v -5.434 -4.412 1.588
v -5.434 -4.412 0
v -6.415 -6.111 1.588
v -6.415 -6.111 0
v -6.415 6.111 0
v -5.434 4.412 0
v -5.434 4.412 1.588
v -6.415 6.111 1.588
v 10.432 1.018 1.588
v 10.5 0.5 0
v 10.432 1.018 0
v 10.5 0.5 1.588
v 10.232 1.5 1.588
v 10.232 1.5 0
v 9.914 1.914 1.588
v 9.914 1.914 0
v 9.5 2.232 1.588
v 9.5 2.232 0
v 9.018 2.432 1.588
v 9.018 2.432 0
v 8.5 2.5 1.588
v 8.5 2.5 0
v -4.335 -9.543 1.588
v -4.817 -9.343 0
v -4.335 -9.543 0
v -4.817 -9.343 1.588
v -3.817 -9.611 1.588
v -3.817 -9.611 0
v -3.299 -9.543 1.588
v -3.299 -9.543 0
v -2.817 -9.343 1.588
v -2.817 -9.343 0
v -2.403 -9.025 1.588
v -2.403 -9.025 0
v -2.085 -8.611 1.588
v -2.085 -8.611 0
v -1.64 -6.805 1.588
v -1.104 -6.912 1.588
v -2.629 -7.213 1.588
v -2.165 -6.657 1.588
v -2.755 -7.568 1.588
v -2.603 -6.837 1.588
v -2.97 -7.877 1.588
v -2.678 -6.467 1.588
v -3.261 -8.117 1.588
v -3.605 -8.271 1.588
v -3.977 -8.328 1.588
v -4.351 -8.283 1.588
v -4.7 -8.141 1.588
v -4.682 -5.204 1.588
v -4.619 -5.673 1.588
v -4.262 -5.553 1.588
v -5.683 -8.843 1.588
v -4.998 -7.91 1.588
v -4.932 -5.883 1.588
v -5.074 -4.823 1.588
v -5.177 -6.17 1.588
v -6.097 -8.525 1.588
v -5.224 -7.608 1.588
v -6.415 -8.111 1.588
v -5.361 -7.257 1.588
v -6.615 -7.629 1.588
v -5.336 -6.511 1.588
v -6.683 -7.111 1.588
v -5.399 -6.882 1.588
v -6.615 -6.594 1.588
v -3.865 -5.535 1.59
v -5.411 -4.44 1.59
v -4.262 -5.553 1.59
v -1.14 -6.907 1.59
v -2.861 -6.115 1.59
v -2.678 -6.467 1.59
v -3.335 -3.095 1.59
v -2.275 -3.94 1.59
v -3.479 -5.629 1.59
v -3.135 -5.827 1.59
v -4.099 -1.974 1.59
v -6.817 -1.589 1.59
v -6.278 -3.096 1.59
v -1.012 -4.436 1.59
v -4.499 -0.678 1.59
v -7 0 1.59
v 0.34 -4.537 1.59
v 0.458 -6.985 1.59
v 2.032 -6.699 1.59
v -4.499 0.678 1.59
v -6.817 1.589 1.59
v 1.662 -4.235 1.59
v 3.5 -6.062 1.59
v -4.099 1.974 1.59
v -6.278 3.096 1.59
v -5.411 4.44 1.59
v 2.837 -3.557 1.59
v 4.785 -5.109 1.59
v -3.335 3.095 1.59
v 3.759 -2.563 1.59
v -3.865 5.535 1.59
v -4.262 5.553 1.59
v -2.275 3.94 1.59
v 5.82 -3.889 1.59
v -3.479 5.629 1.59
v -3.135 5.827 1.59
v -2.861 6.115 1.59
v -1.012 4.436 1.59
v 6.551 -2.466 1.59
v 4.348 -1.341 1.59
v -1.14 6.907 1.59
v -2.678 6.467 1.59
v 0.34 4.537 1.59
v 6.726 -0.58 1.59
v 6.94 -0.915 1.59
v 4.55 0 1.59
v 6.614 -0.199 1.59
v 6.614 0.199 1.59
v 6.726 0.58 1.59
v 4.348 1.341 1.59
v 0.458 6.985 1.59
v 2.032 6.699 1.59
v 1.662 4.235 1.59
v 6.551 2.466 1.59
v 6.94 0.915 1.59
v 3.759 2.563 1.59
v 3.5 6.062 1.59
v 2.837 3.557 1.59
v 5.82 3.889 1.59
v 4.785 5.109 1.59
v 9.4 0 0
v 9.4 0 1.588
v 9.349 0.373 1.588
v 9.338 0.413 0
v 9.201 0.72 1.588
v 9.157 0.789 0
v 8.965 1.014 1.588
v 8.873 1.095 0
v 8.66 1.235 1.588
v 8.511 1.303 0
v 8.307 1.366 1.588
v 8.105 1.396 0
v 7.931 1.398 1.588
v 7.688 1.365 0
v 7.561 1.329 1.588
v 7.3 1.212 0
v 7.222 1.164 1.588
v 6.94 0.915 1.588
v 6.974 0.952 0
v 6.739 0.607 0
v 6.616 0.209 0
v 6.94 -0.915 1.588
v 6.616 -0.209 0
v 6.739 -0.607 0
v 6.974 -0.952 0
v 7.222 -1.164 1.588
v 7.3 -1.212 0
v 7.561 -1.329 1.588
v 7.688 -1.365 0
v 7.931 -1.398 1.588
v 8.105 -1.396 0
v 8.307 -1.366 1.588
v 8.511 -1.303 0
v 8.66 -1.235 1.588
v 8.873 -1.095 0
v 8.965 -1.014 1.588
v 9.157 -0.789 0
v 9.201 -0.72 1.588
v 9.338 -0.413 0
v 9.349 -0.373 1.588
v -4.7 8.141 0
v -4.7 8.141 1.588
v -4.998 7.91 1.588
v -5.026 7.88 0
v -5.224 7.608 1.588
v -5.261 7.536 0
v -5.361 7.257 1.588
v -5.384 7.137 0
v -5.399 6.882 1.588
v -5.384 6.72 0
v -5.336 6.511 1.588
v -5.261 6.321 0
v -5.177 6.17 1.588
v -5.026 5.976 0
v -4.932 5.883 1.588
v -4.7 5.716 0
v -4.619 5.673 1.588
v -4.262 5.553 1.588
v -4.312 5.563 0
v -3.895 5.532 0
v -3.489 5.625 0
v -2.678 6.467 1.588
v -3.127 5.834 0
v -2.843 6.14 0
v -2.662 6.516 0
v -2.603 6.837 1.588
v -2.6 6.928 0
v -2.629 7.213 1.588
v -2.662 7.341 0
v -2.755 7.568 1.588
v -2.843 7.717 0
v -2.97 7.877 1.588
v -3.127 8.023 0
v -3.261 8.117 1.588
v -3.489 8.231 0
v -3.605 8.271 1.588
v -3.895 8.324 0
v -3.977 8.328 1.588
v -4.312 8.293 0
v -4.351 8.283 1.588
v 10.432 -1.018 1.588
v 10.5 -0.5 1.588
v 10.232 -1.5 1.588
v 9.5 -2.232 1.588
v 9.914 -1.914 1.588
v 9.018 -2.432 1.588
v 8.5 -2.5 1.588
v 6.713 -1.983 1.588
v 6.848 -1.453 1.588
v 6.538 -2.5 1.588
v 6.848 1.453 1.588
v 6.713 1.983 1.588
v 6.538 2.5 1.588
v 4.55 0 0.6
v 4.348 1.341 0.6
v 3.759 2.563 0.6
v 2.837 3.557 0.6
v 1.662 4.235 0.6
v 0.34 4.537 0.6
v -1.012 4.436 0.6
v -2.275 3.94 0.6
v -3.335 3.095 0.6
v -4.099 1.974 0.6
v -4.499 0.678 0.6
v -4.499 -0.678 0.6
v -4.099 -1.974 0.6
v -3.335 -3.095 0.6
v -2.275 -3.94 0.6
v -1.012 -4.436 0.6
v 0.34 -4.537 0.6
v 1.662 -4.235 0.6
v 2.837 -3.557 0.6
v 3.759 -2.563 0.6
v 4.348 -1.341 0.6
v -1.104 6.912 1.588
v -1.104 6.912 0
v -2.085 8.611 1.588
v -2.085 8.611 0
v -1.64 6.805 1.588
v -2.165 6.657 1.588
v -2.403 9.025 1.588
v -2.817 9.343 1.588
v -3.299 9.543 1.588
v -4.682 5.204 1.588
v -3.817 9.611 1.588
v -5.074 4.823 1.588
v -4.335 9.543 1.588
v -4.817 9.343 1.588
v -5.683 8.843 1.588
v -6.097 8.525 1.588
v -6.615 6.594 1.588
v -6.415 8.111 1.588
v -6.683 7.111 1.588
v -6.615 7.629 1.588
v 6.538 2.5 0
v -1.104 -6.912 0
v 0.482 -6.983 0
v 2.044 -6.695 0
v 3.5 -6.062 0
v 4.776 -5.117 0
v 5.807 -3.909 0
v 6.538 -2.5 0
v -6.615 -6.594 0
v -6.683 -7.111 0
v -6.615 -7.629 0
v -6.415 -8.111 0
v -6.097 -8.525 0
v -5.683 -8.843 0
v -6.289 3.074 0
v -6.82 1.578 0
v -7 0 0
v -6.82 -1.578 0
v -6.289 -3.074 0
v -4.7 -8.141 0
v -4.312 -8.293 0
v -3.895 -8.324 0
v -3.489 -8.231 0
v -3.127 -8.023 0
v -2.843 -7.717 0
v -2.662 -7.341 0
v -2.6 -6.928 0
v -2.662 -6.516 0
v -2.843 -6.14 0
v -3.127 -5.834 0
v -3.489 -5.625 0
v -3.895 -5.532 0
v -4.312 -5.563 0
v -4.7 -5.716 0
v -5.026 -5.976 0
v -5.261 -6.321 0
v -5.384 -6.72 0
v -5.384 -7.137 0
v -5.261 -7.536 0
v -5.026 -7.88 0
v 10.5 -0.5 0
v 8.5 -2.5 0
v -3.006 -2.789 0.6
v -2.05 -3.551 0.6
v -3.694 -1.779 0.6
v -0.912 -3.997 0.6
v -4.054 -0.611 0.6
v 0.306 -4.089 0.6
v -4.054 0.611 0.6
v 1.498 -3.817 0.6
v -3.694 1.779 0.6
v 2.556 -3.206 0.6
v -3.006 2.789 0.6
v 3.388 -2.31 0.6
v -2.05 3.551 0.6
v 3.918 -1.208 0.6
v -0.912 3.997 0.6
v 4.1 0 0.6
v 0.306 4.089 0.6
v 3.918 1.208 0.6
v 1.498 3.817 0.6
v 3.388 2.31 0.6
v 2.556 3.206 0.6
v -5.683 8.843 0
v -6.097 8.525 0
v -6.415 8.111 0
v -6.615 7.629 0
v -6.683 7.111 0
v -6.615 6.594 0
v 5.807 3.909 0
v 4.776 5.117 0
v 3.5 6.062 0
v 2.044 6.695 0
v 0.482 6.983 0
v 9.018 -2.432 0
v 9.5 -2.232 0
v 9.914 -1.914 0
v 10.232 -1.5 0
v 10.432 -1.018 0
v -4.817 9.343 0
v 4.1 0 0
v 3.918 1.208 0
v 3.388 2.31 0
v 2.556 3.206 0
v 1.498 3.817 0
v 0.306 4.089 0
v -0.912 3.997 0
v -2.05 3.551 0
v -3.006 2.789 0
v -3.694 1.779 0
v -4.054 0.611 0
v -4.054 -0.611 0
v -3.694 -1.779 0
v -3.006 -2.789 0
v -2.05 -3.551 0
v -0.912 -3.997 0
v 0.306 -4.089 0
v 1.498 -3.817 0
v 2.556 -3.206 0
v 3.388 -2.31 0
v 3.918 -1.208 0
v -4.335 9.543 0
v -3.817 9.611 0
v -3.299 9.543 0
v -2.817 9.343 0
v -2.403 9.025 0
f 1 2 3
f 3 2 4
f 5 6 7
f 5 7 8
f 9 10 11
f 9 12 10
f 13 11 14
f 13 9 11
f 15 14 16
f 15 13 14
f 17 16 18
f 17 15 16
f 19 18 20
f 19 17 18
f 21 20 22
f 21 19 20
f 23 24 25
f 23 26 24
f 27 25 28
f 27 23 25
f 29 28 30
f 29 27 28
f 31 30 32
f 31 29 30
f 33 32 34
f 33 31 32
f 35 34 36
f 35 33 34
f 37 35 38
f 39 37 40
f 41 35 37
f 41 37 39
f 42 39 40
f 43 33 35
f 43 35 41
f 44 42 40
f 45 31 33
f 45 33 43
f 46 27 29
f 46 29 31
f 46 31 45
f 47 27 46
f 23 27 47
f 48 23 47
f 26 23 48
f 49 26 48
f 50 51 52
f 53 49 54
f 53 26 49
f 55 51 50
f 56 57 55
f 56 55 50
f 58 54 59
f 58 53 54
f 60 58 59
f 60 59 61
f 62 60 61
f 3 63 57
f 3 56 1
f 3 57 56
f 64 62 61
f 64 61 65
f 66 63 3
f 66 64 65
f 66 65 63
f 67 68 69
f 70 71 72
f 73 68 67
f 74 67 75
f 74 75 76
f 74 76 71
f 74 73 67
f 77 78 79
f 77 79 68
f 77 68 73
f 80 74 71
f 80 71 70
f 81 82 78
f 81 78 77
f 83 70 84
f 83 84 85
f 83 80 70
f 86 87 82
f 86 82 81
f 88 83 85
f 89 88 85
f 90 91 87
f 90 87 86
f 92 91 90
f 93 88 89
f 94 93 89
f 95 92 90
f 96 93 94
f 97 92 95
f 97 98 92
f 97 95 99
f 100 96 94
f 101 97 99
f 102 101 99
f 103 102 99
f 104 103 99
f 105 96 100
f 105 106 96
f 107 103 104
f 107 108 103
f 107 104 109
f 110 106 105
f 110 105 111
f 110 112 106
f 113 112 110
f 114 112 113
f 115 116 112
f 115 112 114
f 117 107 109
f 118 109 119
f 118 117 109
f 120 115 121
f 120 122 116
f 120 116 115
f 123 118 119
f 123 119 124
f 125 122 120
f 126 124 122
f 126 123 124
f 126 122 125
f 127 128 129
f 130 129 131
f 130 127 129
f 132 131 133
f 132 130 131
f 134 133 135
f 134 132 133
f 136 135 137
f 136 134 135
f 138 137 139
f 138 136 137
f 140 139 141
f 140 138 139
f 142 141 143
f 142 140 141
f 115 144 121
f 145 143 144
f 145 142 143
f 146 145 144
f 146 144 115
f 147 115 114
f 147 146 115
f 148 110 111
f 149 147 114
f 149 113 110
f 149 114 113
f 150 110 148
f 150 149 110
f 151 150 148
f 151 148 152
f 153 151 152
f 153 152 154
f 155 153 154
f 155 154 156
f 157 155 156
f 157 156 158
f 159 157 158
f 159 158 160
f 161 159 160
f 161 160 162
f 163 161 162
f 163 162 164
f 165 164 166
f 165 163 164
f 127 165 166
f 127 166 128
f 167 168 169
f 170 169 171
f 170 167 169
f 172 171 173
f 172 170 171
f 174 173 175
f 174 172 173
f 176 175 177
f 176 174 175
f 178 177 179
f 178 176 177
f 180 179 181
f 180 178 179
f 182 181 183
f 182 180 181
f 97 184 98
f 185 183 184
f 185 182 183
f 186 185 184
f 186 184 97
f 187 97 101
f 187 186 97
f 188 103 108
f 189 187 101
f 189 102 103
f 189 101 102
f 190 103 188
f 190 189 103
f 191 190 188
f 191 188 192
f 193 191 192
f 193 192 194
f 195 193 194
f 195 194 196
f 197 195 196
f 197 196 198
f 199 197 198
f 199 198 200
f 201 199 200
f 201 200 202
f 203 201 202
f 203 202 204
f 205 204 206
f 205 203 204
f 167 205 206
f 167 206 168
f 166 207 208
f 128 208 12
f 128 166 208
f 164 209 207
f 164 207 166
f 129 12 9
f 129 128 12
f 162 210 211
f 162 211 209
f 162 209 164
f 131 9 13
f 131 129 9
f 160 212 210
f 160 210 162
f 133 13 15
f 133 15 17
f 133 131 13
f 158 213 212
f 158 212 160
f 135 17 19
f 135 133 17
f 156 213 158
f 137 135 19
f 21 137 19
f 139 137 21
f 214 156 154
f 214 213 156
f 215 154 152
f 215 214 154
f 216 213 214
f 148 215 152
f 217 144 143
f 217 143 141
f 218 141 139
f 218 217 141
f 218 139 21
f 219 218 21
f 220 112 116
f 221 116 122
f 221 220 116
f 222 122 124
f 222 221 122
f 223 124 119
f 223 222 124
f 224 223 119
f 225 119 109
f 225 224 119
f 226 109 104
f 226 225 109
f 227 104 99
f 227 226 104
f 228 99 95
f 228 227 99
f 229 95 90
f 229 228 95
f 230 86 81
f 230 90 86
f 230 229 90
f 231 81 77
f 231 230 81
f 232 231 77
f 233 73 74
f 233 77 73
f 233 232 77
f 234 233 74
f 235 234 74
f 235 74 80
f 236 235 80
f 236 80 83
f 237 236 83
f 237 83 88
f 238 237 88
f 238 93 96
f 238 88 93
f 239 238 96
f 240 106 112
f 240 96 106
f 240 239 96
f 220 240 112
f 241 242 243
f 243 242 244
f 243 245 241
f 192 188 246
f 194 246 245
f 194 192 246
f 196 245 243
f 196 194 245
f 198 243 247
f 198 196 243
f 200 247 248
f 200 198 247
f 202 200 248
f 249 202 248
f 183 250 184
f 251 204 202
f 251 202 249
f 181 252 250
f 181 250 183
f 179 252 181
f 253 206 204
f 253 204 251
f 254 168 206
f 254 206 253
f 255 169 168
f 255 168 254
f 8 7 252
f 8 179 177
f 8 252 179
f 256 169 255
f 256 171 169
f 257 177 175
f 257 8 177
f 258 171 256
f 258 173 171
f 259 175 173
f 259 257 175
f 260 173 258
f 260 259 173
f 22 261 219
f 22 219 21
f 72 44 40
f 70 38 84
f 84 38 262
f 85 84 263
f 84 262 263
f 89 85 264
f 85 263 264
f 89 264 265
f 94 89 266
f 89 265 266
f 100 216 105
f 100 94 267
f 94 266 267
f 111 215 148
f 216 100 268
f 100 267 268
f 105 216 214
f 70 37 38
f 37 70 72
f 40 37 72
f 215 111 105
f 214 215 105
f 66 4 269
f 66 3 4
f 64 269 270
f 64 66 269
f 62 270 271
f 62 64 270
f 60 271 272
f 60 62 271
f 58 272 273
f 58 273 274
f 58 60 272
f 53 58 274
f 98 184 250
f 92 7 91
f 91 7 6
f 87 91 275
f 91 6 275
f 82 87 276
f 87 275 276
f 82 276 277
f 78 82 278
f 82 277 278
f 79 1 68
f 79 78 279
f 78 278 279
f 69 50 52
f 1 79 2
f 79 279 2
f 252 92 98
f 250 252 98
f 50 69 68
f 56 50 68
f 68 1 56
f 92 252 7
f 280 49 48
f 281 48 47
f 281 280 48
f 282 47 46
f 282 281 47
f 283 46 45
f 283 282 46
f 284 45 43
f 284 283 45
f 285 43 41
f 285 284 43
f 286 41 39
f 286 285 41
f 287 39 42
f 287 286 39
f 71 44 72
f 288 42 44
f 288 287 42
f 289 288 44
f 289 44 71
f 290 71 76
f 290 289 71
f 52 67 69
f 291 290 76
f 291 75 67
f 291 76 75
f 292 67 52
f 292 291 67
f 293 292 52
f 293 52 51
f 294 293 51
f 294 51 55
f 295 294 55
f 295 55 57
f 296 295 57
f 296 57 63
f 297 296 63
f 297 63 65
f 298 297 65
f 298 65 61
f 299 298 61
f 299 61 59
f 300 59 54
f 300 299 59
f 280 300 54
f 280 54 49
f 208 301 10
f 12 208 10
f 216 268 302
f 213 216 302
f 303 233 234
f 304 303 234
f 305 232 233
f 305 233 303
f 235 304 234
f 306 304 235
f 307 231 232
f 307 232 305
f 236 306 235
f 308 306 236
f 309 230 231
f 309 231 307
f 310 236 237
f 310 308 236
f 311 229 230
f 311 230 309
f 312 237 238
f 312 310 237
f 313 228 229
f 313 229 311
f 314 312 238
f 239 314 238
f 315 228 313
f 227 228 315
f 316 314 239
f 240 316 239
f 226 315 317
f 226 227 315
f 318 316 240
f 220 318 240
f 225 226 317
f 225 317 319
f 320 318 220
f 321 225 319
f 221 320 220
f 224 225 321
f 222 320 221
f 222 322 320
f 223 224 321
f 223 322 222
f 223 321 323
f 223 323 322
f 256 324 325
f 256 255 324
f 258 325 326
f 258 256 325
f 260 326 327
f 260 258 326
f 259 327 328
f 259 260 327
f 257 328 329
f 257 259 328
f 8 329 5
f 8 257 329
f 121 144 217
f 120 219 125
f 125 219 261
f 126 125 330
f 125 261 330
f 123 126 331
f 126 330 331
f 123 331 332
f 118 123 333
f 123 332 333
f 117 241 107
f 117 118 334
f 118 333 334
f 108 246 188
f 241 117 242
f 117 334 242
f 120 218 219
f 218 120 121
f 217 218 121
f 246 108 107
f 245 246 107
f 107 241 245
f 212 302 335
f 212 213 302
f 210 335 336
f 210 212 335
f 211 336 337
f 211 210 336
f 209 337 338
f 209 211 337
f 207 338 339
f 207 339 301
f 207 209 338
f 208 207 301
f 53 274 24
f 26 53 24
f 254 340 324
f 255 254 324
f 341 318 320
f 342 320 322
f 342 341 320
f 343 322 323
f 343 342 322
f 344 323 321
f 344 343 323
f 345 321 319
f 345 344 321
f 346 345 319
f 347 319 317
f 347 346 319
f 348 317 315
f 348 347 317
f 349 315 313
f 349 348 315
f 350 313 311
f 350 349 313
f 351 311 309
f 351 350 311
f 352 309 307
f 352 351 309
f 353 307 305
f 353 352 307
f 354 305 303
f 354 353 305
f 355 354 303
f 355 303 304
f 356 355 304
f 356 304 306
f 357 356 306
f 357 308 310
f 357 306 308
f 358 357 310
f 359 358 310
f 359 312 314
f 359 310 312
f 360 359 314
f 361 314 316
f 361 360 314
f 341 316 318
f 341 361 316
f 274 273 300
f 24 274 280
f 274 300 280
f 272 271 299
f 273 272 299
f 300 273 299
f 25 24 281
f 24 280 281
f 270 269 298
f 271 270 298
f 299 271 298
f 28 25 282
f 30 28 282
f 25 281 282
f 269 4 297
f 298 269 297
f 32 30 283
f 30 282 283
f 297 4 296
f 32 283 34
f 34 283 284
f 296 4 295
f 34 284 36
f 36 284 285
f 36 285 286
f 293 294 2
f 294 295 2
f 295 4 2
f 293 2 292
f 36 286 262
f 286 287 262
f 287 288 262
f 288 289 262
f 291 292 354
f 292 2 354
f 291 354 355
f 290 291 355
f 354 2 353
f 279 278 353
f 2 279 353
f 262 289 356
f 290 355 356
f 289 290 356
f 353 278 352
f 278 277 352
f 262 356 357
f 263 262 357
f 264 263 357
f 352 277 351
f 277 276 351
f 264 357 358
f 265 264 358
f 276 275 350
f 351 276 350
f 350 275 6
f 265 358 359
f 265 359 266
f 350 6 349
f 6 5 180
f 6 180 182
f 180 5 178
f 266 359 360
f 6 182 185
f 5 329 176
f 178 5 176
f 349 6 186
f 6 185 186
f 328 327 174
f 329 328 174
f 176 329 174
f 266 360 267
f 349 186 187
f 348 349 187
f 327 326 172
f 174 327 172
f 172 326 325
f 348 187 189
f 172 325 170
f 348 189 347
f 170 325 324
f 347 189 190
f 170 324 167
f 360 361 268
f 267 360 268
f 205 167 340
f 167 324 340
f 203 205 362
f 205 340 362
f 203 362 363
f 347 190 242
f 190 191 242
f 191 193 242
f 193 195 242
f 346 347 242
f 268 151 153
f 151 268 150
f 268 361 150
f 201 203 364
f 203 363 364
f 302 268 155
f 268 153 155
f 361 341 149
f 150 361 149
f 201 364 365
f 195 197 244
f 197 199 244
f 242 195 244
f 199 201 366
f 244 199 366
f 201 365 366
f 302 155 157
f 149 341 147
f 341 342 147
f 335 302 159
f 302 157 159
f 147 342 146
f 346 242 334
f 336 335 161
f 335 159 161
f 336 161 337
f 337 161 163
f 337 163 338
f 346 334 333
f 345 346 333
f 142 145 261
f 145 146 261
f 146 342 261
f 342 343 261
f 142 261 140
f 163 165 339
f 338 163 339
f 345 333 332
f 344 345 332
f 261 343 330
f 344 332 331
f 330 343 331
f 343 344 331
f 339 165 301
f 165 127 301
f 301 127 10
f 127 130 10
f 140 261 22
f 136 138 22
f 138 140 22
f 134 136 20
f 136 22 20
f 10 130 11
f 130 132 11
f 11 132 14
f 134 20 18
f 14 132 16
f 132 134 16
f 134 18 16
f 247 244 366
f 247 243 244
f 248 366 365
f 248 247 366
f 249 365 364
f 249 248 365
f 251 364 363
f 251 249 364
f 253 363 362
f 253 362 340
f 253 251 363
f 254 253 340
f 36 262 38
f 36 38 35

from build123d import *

# Parameters (mm, degrees)
CYLINDER030_R     = 4.55
CYLINDER030_DEPTH = 10
CYLINDER029_R     = 1.4
CYLINDER029_DEPTH = 10
ARRAY002_COUNT    = 3
CYLINDER031_R     = 4.1
CYLINDER031_DEPTH = 10
BOX002_W          = 10
BOX002_H          = 5
BOX002_DEPTH      = 1.5875
FILLET001_R       = 2
ARRAY003_COUNT    = 3
CYLINDER032_R     = 7
CYLINDER032_DEPTH = 1.59


with BuildPart() as mountplatelip001:
    # Cylinder030 → Cylinder030 (new body)
    with BuildSketch(Plane.XY.offset(0.6)):
        Circle(CYLINDER030_R)
    extrude(amount=CYLINDER030_DEPTH)


with BuildPart() as array002:
    # Cylinder029 → Cylinder029 (new body)
    with BuildSketch(Plane(origin=(8, 0, 0), x_dir=(1, 0, 0), z_dir=(0, 0, 1))):
        Circle(CYLINDER029_R)
    extrude(amount=CYLINDER029_DEPTH)

    # Array002: Array002 ×3 about axis
    array002_axis = Axis((0, 0, 0), (0, 0, 1))


with BuildPart() as array002_1:
    add(array002.part)
    for i in range(1, ARRAY002_COUNT):
        add(array002.part.rotate(array002_axis, i * 360 / ARRAY002_COUNT))


with BuildPart() as fusion006:
    # Cylinder031 → Cylinder031 (new body)
    with BuildSketch(Plane.XY):
        Circle(CYLINDER031_R)
    extrude(amount=CYLINDER031_DEPTH)

    # Fusion006: union MountPlateLip001, Array002
    add(mountplatelip001.part)
    add(array002_1.part)


with BuildPart() as array003:
    # Box002 → Box002 (new body)
    with BuildSketch(Plane(origin=(0.5, -2.5, 0), x_dir=(1, 0, 0), z_dir=(0, 0, 1))):
        with Locations((5, 2.5)):
            Rectangle(BOX002_W, BOX002_H)
    extrude(amount=BOX002_DEPTH)

    # Fillet001
    fillet001_edges = [array003.edges().sort_by_distance(p)[0] for p in [
        (10.5, -2.5, 0.79375),
        (10.5, 2.5, 0.79375),
    ]]
    fillet(fillet001_edges, radius=FILLET001_R)

    # Array003: Array003 ×3 about axis
    array003_axis = Axis((0, 0, 0), (0, 0, 1))


with BuildPart() as array003_1:
    add(array003.part)
    for i in range(1, ARRAY003_COUNT):
        add(array003.part.rotate(array003_axis, i * 360 / ARRAY003_COUNT))


with BuildPart() as cut009:
    # Cylinder032 → Cylinder032 (new body)
    with BuildSketch(Plane.XY):
        Circle(CYLINDER032_R)
    extrude(amount=CYLINDER032_DEPTH)

    # Fusion007: union Array003
    add(array003_1.part)

    # Cut009: cut Fusion006
    add(fusion006.part, mode=Mode.SUBTRACT)


solid = cut009.part
